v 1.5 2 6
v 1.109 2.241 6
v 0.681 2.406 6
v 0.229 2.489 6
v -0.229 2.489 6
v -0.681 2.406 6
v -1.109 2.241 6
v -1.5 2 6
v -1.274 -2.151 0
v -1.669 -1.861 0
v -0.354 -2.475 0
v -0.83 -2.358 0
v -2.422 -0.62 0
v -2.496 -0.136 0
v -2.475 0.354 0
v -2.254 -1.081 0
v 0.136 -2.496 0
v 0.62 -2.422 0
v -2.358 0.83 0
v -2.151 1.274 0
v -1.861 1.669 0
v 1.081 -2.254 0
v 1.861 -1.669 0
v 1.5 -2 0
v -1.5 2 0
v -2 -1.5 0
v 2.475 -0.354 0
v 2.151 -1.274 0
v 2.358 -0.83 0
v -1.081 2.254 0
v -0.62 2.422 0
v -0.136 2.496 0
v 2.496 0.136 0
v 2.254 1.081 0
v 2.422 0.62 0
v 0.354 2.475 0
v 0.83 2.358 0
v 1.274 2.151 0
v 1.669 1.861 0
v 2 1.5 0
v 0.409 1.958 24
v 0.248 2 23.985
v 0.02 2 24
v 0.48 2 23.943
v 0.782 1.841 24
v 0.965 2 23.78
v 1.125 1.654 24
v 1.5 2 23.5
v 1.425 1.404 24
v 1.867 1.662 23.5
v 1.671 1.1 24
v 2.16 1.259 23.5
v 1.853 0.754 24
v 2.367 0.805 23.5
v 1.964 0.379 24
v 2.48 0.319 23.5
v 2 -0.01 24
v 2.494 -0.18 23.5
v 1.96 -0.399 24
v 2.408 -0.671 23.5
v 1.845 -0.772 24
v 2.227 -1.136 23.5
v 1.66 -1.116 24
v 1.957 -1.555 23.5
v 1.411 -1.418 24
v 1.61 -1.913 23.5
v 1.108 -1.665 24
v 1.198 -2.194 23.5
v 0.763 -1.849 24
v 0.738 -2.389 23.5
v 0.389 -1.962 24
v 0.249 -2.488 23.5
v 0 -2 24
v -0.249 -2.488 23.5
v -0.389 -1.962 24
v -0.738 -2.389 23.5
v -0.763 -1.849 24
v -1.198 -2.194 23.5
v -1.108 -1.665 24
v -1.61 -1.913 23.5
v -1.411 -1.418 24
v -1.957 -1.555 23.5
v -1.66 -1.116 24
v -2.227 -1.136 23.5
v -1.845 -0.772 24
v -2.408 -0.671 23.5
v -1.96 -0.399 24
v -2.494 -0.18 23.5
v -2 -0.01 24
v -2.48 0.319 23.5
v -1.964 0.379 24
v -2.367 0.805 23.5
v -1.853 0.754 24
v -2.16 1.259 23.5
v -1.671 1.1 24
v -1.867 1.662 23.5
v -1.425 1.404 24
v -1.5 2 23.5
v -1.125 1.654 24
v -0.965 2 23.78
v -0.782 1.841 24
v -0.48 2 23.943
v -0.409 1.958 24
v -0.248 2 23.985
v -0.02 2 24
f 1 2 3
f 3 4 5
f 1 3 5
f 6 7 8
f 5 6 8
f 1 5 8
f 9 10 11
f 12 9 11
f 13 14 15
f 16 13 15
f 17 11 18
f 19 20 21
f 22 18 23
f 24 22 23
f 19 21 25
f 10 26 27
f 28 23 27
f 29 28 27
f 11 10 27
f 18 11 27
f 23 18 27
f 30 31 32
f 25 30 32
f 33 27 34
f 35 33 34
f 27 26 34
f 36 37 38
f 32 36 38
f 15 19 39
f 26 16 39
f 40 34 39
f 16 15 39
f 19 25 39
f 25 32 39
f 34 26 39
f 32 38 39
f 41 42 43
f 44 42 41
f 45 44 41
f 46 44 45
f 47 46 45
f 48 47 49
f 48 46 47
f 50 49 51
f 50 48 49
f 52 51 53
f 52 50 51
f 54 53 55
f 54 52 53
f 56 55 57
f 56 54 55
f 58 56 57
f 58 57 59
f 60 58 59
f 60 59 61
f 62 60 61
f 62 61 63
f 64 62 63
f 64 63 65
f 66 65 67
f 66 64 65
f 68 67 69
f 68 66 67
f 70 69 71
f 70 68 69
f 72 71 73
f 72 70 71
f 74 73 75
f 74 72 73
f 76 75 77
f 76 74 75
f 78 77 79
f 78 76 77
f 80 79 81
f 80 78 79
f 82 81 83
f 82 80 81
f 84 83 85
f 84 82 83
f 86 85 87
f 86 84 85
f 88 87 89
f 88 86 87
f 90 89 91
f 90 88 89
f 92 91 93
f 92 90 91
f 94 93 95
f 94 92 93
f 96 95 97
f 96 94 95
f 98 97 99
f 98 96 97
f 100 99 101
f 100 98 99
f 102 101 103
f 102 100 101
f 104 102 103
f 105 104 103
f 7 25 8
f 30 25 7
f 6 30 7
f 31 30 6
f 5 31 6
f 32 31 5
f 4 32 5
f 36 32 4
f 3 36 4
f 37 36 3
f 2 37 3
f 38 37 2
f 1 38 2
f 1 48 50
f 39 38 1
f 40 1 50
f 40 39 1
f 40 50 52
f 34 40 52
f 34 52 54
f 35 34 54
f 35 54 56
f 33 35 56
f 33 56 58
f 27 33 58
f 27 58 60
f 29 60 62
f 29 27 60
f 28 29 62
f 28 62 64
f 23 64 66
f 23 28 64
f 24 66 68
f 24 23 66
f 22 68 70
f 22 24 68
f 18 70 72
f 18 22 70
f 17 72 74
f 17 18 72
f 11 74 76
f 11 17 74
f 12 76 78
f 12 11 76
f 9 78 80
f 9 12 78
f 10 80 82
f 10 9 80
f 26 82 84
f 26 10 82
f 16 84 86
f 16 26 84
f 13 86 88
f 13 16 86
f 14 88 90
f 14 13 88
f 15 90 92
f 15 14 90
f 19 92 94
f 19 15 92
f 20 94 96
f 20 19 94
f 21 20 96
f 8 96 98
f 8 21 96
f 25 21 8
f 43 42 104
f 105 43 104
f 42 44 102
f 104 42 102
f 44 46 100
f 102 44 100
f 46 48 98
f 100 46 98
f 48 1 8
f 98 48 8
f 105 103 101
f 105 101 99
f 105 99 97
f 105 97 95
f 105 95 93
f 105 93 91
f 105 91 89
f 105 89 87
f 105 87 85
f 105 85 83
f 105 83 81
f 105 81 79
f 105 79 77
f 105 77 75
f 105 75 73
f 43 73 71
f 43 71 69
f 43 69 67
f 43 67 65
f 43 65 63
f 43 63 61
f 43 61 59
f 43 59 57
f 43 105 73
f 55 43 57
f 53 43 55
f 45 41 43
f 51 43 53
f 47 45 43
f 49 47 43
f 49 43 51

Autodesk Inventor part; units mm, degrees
ref_plane "YZ Plane" through (0, 0, 0) normal (1, 0, 0) x (0, 1, 0)
ref_plane "XZ Plane" through (0, 0, 0) normal (0, 1, 0) x (-1, 0, 0)
ref_plane "XY Plane" through (0, 0, 0) normal (0, 0, 1) x (1, 0, 0)
sketch "Sketch1" plane through (0, 0, 0) normal (0, 0, 1) x (1, 0, 0)
  circle A0 centre (0, 0) radius 2.5
  line L0 (-1.5, 2) -> (1.5, 2)
  dimension "d0" = 5
sketch "Sketch1 outline for Extrusion1" plane through (0, 0, 0) normal (0, 0, 1) x (1, 0, 0)
  line L0 (1.5, 2) -> (-1.5, 2)
  arc A0 (-1.5, 2) -> (1.5, 2) centre (0, 0) ccw
extrude "Extrusion1" add sketch "Sketch1 outline for Extrusion1" along normal blind 24
sketch "Sketch2" plane through (0, 0, 0) normal (0, 0, -1) x (-1, 0, 0)
  line L0 (-1.5, 2) -> (1.5, 2) projected
  arc A0 (-1.5, 2) -> (1.5, 2) centre (0, 0) ccw projected
  arc A1 (1.5, 2) -> (-1.5, 2) centre (0, 0) ccw
  dimension "d3" = 2.5
sketch "Sketch2 outline for Extrusion2" plane through (0, 0, 0) normal (0, 0, -1) x (-1, 0, 0)
  line L0 (-1.5, 2) -> (1.5, 2)
  arc A0 (1.5, 2) -> (-1.5, 2) centre (0, 0) ccw
extrude "Extrusion2" add sketch "Sketch2 outline for Extrusion2" against normal blind 6
chamfer "Chamfer1" distance 0.5 angle 45 1 edges at (0, -2.5, 24)
properties part number "Stepper Motor Shaft"
